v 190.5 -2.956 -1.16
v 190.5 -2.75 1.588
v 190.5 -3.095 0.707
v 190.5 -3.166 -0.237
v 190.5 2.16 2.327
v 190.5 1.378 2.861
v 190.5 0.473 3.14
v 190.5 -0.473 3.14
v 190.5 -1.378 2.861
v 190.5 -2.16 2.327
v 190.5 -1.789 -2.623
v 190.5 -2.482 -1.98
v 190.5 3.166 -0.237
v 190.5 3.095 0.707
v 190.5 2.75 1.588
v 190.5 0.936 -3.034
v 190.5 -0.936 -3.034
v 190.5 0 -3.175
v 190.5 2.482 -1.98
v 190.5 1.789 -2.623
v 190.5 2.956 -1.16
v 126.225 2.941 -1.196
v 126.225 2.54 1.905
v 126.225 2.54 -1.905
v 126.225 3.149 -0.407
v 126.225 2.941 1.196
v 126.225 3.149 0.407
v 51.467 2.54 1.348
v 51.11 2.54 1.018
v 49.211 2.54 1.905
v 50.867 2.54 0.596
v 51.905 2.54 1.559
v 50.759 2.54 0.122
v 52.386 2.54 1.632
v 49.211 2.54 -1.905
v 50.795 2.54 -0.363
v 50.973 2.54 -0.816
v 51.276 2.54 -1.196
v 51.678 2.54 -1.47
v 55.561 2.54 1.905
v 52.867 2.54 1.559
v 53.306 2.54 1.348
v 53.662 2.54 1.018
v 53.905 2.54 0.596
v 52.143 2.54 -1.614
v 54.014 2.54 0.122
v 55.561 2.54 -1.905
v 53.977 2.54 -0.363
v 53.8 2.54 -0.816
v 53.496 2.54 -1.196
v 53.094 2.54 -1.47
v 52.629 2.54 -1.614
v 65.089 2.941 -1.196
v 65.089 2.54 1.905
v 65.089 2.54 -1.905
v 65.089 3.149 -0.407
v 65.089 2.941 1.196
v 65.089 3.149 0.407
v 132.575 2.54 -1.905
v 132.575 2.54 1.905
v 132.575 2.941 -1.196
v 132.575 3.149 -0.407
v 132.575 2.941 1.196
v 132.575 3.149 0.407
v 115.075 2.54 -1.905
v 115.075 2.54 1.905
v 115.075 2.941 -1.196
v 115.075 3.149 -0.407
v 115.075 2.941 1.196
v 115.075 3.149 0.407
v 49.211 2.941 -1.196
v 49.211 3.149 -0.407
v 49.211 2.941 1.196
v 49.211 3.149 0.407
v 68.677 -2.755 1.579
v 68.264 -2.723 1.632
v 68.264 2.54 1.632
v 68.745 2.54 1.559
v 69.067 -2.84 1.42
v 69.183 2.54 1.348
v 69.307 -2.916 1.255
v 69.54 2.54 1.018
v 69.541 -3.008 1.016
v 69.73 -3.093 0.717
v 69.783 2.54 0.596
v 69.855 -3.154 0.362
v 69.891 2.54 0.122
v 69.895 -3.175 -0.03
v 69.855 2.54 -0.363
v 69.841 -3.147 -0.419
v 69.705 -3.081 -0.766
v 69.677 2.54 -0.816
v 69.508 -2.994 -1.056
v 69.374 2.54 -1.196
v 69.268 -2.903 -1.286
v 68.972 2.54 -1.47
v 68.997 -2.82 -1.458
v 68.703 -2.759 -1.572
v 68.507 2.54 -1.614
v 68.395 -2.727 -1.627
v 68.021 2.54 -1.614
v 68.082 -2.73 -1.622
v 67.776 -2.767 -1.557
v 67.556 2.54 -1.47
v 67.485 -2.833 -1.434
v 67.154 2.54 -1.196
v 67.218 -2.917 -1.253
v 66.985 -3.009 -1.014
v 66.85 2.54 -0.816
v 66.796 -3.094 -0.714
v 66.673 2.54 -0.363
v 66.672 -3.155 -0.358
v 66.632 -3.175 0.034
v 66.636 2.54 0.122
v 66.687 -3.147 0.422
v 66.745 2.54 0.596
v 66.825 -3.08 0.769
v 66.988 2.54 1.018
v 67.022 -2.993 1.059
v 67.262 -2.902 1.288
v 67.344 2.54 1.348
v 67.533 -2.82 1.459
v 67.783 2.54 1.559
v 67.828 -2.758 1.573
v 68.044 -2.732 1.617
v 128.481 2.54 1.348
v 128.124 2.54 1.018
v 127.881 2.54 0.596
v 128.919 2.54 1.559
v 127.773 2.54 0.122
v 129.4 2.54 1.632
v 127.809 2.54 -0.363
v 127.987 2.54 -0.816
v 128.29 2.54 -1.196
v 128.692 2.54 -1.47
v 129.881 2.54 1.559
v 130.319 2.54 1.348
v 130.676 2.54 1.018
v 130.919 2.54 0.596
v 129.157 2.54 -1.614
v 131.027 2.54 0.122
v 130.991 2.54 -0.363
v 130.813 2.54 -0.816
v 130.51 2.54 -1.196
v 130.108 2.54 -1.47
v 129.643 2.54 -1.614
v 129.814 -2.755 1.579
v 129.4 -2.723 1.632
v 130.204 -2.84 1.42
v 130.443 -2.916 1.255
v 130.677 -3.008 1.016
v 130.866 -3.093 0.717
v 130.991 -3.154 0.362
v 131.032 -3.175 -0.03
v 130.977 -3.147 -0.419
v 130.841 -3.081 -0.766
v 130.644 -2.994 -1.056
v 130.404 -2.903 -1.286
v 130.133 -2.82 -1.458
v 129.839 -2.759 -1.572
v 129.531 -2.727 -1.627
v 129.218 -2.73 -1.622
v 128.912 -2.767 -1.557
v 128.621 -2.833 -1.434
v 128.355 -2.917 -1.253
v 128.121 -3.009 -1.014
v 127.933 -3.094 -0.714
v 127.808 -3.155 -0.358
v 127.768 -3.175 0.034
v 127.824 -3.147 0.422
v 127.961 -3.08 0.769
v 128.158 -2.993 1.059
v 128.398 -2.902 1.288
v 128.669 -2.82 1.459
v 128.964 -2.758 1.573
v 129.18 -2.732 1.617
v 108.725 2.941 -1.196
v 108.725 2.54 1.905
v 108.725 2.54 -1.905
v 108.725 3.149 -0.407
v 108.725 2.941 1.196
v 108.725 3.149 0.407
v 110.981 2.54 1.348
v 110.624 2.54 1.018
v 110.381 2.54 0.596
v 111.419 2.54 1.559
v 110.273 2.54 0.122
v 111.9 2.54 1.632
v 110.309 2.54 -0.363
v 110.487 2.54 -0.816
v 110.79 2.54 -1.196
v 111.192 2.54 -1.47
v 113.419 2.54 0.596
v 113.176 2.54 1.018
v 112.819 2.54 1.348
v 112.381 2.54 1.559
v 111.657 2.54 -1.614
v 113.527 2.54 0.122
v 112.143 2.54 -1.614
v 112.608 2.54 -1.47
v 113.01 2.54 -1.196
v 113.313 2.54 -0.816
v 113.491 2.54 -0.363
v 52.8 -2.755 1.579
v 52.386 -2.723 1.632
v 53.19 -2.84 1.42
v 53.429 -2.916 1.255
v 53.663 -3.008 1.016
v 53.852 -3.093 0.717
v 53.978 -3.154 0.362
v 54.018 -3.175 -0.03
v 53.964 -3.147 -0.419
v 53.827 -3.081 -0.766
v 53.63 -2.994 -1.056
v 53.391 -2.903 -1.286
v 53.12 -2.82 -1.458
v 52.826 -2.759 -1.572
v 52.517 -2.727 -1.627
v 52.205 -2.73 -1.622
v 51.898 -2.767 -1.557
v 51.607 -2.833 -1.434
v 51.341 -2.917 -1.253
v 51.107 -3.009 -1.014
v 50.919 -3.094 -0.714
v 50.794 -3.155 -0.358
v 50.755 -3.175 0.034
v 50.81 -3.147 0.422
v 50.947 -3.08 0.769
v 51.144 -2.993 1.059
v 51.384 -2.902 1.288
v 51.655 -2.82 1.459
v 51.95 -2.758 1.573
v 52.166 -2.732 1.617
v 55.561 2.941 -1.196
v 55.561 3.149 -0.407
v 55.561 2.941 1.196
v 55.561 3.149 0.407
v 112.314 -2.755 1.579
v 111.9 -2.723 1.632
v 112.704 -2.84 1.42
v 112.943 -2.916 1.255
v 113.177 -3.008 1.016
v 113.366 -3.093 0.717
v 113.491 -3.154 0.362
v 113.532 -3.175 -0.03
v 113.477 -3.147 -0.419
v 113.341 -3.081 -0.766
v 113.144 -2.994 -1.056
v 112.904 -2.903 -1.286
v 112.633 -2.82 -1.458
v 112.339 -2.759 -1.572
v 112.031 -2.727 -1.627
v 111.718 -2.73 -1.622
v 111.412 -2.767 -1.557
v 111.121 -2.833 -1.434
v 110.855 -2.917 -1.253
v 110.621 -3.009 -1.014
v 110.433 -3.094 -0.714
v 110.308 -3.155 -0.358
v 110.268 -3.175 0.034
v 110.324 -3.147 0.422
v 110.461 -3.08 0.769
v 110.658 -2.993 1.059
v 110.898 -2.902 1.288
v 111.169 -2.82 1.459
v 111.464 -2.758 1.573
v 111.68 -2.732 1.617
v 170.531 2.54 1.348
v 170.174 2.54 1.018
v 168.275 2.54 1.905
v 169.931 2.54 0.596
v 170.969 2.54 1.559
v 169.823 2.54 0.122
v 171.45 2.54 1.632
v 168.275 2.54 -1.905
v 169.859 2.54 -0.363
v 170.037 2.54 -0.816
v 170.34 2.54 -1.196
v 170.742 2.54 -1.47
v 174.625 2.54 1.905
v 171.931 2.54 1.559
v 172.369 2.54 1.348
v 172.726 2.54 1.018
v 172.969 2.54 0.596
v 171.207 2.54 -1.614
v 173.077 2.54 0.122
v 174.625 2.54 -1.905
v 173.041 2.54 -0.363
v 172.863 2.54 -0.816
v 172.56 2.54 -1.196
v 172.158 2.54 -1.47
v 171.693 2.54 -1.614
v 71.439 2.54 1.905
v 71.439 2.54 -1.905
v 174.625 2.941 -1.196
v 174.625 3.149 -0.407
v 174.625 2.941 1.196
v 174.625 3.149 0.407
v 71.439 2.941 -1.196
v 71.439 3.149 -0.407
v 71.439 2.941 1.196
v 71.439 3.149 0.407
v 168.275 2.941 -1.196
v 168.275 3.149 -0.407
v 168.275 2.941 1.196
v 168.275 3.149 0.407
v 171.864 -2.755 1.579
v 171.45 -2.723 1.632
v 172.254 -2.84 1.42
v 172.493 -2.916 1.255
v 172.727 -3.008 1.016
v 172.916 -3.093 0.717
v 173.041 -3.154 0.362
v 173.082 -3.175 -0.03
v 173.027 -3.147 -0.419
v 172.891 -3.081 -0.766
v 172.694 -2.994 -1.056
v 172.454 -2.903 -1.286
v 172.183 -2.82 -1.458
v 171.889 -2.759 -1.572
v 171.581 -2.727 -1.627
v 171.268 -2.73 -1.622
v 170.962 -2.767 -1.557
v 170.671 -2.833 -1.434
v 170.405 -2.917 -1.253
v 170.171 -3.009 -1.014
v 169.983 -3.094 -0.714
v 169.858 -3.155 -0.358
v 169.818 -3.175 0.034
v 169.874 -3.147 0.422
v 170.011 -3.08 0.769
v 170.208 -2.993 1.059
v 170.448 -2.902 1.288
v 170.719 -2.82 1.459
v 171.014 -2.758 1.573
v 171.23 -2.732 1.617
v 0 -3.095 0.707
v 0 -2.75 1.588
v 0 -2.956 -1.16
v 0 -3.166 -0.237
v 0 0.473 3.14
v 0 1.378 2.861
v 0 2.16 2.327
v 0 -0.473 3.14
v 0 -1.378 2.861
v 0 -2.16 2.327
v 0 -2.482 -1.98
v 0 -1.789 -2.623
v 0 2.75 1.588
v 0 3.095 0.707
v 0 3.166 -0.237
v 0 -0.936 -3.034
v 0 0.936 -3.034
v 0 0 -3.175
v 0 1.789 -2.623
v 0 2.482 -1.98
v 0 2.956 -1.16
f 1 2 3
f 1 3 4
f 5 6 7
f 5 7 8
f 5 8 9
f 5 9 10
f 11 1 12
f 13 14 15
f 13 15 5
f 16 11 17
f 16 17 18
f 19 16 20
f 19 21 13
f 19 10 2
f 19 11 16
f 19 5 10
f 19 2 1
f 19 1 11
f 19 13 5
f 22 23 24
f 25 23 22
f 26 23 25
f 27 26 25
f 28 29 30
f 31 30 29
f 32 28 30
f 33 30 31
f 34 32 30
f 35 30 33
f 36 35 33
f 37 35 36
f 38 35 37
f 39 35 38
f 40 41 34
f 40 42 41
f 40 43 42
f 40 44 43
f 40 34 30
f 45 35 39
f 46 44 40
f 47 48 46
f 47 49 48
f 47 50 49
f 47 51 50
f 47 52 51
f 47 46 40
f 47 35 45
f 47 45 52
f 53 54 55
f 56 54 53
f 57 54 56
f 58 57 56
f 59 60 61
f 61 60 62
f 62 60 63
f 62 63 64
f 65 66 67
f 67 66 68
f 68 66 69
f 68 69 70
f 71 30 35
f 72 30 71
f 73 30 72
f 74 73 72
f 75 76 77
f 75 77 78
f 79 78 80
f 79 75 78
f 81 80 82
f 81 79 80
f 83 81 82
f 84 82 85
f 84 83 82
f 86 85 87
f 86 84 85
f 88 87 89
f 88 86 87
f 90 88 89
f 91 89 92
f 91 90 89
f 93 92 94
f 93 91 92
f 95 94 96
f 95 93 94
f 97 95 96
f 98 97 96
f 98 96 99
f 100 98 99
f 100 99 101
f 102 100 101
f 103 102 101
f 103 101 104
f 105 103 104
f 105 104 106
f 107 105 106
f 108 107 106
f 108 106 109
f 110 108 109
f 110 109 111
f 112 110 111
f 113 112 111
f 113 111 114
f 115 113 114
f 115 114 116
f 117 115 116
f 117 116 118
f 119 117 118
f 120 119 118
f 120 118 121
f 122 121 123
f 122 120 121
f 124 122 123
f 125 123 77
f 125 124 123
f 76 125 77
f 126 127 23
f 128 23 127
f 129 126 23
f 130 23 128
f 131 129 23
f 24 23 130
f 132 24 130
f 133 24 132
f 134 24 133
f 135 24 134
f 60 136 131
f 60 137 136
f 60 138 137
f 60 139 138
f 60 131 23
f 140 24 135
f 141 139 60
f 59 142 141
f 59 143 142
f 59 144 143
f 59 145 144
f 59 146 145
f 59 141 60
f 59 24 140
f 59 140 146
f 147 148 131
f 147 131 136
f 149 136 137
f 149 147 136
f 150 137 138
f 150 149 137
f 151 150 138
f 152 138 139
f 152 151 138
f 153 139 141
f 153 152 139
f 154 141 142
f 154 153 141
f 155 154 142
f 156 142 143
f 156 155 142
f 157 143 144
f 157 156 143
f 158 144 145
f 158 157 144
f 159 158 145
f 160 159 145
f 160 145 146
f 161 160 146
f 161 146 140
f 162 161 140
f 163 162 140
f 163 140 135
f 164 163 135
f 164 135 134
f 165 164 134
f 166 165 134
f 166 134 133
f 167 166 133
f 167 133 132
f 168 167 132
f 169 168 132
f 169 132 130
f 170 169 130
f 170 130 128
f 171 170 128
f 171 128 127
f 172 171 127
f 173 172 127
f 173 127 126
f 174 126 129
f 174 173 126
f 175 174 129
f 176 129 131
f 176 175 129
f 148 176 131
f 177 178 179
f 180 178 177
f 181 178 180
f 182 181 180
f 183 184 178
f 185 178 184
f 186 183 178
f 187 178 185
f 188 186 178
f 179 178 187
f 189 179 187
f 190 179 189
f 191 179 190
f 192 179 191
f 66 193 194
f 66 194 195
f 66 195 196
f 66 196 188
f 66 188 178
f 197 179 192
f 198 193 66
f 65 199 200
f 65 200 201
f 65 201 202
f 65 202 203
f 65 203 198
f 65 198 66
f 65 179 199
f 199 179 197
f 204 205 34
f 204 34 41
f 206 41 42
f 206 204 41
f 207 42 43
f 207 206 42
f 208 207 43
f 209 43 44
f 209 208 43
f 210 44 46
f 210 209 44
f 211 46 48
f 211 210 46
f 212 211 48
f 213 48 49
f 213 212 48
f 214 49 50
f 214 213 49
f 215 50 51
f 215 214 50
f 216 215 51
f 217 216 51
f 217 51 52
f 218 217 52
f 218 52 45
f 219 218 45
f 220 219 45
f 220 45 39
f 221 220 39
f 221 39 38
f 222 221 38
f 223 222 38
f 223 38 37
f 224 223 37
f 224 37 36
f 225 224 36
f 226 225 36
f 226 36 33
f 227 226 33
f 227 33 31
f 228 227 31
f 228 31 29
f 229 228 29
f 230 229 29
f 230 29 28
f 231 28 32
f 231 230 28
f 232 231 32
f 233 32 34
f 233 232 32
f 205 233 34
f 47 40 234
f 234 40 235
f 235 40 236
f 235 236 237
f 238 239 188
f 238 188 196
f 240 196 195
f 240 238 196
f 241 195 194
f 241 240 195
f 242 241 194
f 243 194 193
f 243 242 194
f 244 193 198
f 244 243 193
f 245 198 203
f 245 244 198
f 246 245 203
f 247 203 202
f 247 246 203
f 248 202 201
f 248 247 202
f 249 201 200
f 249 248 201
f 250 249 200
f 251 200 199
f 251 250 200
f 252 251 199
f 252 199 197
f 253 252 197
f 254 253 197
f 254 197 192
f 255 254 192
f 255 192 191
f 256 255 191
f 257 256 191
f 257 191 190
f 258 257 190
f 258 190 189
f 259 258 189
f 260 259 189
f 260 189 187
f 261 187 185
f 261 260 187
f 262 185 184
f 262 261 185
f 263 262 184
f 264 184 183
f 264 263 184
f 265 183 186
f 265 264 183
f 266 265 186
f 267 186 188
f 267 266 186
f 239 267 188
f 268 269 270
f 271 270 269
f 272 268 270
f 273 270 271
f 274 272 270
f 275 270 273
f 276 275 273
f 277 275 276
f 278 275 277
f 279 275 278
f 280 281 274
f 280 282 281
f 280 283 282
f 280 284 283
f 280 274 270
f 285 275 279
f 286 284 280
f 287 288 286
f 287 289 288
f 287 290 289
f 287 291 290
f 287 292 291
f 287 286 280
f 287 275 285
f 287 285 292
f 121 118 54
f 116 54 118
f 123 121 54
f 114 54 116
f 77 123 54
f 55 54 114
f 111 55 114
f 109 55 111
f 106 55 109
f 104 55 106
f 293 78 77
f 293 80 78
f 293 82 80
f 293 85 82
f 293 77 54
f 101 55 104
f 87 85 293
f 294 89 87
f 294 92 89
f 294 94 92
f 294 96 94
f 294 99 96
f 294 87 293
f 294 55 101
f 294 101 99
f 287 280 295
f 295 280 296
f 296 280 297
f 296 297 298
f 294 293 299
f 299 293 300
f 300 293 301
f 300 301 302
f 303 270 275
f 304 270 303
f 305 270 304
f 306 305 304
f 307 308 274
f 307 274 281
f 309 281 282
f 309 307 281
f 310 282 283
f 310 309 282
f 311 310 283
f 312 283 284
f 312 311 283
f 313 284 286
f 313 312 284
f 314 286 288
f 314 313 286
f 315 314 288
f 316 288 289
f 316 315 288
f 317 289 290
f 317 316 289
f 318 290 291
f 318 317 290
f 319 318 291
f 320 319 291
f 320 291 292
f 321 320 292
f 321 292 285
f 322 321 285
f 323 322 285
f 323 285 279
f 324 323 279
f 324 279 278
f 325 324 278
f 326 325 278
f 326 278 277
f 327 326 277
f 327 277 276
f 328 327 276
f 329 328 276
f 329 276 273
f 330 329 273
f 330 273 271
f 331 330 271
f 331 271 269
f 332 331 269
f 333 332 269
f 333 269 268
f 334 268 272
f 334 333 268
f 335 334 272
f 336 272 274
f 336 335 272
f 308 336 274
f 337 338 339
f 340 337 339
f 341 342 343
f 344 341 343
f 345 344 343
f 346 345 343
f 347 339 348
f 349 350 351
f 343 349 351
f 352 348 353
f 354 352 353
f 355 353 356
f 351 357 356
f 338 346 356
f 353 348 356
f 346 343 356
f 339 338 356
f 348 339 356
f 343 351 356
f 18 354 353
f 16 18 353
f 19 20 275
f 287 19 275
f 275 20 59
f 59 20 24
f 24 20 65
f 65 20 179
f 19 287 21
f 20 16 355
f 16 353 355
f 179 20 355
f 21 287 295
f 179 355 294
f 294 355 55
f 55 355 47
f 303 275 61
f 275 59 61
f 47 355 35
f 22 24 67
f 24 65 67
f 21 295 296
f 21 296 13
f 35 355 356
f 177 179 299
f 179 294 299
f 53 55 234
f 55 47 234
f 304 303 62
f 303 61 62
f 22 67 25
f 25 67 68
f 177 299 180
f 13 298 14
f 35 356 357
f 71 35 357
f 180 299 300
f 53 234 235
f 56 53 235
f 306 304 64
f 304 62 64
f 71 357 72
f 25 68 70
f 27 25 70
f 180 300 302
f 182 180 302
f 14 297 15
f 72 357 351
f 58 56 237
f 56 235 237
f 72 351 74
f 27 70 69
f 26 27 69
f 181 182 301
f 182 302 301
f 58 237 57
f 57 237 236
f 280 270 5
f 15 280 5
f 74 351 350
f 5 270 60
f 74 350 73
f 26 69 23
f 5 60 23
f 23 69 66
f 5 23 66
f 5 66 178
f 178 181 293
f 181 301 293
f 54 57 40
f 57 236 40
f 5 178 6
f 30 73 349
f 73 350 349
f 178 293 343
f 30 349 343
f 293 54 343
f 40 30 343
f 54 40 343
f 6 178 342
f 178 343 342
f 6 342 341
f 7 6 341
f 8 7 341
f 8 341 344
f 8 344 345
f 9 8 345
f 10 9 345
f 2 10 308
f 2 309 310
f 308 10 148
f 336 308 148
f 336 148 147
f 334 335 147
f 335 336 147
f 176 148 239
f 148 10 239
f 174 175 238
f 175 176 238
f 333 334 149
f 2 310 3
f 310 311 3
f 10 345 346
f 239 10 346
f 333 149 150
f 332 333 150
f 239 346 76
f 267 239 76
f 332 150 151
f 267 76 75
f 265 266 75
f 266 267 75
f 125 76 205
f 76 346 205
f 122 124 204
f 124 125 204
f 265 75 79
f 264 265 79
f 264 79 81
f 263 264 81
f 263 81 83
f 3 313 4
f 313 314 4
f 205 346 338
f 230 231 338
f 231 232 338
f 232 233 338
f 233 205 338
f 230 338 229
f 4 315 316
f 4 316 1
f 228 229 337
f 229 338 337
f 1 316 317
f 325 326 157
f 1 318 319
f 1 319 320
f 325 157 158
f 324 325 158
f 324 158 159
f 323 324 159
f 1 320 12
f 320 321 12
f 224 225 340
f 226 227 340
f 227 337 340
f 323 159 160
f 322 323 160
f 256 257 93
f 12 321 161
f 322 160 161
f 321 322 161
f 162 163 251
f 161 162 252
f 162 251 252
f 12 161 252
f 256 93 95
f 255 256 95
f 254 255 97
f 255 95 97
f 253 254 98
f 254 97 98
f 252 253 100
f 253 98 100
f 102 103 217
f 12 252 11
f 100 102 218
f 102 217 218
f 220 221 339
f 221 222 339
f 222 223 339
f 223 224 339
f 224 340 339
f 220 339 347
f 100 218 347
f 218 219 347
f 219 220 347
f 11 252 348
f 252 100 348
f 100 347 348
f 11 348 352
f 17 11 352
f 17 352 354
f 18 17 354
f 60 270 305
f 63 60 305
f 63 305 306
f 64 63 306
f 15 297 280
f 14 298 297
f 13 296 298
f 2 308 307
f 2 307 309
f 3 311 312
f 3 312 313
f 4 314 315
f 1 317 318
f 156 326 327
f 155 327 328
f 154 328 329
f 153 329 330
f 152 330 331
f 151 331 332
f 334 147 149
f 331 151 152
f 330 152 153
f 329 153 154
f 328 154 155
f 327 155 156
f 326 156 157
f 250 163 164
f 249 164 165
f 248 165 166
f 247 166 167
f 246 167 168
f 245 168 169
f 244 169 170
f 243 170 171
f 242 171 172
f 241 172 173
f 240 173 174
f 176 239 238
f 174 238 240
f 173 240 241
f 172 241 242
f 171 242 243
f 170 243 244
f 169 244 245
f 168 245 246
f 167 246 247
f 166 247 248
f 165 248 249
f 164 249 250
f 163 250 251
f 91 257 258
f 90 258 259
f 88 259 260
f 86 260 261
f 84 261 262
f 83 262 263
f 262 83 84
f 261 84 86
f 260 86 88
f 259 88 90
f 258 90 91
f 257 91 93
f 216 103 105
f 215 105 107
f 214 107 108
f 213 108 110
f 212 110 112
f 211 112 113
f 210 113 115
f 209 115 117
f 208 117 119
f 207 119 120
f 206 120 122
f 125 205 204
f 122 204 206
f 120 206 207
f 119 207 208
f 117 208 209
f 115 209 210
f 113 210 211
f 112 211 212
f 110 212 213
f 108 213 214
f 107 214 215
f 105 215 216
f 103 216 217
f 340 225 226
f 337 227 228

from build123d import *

# Parameters (mm, degrees)
SKETCH1_R               = 3.175
BOSS_EXTRUDE1_DEPTH     = 190.5
CUT_EXTRUDE1_DEPTH      = 191.552909319
CUT_EXTRUDE1_DEPTH_BACK = 191.552909319
SKETCH2_R               = 1.63195
CUT_EXTRUDE2_START      = 2.54
SKETCH2_3_W             = 6.35
SKETCH2_3_H             = 15.5259893
SKETCH2_3_R             = 1.63195
SKETCH2_3_H_2           = 21.77390706
CUT_EXTRUDE2_DEPTH      = 189.012909422


with BuildPart() as part:
    # Sketch1 → Boss-Extrude1 (new body)
    with BuildSketch(Plane(origin=(0, 0, 0), x_dir=(0, 0, -1), z_dir=(1, 0, 0))):
        Circle(SKETCH1_R)
    extrude(amount=BOSS_EXTRUDE1_DEPTH)

    # Sketch2 → Cut-Extrude1 (cut, two sides: drawn at the far end of the back side and taken through both)
    with BuildSketch(Plane(origin=(0, 0, 0), x_dir=(1, 0, 0), z_dir=(0, 1, 0)).offset(-CUT_EXTRUDE1_DEPTH_BACK)):
        with Locations((171.45, 0)):
            Circle(SKETCH2_R)
        with Locations((52.38623, 0)):
            Circle(SKETCH2_R)
        with Locations((111.9, 0)):
            Circle(SKETCH2_R)
        with Locations((68.26377, 0)):
            Circle(SKETCH2_R)
        with Locations((129.4, 0)):
            Circle(SKETCH2_R)
    extrude(amount=CUT_EXTRUDE1_DEPTH + CUT_EXTRUDE1_DEPTH_BACK, mode=Mode.SUBTRACT)

    # Sketch2<3> → Cut-Extrude2 (cut, through all)
    # profile 1 of 5: a face of its own
    with BuildSketch(Plane(origin=(0, 0, 0), x_dir=(1, 0, 0), z_dir=(0, 1, 0)).offset(CUT_EXTRUDE2_START)):
        with Locations((68.26377, 0)):
            Rectangle(SKETCH2_3_W, SKETCH2_3_H)
        with Locations((68.26377, 0)):
            Circle(SKETCH2_3_R, mode=Mode.SUBTRACT)
    # profile 2 of 5: a face of its own
    with BuildSketch(Plane(origin=(0, 0, 0), x_dir=(1, 0, 0), z_dir=(0, 1, 0)).offset(CUT_EXTRUDE2_START)):
        with Locations((52.38623, 0)):
            Rectangle(SKETCH2_3_W, SKETCH2_3_H)
        with Locations((52.38623, 0)):
            Circle(SKETCH2_3_R, mode=Mode.SUBTRACT)
    # profile 3 of 5: a face of its own
    with BuildSketch(Plane(origin=(0, 0, 0), x_dir=(1, 0, 0), z_dir=(0, 1, 0)).offset(CUT_EXTRUDE2_START)):
        with Locations((111.9, 0)):
            Rectangle(SKETCH2_3_W, SKETCH2_3_H)
    # profile 4 of 5: a face of its own
    with BuildSketch(Plane(origin=(0, 0, 0), x_dir=(1, 0, 0), z_dir=(0, 1, 0)).offset(CUT_EXTRUDE2_START)):
        with Locations((171.45, 0)):
            Rectangle(SKETCH2_3_W, SKETCH2_3_H_2)
        with Locations((171.45, 0)):
            Circle(SKETCH2_3_R, mode=Mode.SUBTRACT)
    # profile 5 of 5: a face of its own
    with BuildSketch(Plane(origin=(0, 0, 0), x_dir=(1, 0, 0), z_dir=(0, 1, 0)).offset(CUT_EXTRUDE2_START)):
        with Locations((129.4, 0)):
            Rectangle(SKETCH2_3_W, SKETCH2_3_H)
        with Locations((129.4, 0)):
            Circle(SKETCH2_3_R, mode=Mode.SUBTRACT)
    extrude(amount=CUT_EXTRUDE2_DEPTH, mode=Mode.SUBTRACT)


solid = part.part
